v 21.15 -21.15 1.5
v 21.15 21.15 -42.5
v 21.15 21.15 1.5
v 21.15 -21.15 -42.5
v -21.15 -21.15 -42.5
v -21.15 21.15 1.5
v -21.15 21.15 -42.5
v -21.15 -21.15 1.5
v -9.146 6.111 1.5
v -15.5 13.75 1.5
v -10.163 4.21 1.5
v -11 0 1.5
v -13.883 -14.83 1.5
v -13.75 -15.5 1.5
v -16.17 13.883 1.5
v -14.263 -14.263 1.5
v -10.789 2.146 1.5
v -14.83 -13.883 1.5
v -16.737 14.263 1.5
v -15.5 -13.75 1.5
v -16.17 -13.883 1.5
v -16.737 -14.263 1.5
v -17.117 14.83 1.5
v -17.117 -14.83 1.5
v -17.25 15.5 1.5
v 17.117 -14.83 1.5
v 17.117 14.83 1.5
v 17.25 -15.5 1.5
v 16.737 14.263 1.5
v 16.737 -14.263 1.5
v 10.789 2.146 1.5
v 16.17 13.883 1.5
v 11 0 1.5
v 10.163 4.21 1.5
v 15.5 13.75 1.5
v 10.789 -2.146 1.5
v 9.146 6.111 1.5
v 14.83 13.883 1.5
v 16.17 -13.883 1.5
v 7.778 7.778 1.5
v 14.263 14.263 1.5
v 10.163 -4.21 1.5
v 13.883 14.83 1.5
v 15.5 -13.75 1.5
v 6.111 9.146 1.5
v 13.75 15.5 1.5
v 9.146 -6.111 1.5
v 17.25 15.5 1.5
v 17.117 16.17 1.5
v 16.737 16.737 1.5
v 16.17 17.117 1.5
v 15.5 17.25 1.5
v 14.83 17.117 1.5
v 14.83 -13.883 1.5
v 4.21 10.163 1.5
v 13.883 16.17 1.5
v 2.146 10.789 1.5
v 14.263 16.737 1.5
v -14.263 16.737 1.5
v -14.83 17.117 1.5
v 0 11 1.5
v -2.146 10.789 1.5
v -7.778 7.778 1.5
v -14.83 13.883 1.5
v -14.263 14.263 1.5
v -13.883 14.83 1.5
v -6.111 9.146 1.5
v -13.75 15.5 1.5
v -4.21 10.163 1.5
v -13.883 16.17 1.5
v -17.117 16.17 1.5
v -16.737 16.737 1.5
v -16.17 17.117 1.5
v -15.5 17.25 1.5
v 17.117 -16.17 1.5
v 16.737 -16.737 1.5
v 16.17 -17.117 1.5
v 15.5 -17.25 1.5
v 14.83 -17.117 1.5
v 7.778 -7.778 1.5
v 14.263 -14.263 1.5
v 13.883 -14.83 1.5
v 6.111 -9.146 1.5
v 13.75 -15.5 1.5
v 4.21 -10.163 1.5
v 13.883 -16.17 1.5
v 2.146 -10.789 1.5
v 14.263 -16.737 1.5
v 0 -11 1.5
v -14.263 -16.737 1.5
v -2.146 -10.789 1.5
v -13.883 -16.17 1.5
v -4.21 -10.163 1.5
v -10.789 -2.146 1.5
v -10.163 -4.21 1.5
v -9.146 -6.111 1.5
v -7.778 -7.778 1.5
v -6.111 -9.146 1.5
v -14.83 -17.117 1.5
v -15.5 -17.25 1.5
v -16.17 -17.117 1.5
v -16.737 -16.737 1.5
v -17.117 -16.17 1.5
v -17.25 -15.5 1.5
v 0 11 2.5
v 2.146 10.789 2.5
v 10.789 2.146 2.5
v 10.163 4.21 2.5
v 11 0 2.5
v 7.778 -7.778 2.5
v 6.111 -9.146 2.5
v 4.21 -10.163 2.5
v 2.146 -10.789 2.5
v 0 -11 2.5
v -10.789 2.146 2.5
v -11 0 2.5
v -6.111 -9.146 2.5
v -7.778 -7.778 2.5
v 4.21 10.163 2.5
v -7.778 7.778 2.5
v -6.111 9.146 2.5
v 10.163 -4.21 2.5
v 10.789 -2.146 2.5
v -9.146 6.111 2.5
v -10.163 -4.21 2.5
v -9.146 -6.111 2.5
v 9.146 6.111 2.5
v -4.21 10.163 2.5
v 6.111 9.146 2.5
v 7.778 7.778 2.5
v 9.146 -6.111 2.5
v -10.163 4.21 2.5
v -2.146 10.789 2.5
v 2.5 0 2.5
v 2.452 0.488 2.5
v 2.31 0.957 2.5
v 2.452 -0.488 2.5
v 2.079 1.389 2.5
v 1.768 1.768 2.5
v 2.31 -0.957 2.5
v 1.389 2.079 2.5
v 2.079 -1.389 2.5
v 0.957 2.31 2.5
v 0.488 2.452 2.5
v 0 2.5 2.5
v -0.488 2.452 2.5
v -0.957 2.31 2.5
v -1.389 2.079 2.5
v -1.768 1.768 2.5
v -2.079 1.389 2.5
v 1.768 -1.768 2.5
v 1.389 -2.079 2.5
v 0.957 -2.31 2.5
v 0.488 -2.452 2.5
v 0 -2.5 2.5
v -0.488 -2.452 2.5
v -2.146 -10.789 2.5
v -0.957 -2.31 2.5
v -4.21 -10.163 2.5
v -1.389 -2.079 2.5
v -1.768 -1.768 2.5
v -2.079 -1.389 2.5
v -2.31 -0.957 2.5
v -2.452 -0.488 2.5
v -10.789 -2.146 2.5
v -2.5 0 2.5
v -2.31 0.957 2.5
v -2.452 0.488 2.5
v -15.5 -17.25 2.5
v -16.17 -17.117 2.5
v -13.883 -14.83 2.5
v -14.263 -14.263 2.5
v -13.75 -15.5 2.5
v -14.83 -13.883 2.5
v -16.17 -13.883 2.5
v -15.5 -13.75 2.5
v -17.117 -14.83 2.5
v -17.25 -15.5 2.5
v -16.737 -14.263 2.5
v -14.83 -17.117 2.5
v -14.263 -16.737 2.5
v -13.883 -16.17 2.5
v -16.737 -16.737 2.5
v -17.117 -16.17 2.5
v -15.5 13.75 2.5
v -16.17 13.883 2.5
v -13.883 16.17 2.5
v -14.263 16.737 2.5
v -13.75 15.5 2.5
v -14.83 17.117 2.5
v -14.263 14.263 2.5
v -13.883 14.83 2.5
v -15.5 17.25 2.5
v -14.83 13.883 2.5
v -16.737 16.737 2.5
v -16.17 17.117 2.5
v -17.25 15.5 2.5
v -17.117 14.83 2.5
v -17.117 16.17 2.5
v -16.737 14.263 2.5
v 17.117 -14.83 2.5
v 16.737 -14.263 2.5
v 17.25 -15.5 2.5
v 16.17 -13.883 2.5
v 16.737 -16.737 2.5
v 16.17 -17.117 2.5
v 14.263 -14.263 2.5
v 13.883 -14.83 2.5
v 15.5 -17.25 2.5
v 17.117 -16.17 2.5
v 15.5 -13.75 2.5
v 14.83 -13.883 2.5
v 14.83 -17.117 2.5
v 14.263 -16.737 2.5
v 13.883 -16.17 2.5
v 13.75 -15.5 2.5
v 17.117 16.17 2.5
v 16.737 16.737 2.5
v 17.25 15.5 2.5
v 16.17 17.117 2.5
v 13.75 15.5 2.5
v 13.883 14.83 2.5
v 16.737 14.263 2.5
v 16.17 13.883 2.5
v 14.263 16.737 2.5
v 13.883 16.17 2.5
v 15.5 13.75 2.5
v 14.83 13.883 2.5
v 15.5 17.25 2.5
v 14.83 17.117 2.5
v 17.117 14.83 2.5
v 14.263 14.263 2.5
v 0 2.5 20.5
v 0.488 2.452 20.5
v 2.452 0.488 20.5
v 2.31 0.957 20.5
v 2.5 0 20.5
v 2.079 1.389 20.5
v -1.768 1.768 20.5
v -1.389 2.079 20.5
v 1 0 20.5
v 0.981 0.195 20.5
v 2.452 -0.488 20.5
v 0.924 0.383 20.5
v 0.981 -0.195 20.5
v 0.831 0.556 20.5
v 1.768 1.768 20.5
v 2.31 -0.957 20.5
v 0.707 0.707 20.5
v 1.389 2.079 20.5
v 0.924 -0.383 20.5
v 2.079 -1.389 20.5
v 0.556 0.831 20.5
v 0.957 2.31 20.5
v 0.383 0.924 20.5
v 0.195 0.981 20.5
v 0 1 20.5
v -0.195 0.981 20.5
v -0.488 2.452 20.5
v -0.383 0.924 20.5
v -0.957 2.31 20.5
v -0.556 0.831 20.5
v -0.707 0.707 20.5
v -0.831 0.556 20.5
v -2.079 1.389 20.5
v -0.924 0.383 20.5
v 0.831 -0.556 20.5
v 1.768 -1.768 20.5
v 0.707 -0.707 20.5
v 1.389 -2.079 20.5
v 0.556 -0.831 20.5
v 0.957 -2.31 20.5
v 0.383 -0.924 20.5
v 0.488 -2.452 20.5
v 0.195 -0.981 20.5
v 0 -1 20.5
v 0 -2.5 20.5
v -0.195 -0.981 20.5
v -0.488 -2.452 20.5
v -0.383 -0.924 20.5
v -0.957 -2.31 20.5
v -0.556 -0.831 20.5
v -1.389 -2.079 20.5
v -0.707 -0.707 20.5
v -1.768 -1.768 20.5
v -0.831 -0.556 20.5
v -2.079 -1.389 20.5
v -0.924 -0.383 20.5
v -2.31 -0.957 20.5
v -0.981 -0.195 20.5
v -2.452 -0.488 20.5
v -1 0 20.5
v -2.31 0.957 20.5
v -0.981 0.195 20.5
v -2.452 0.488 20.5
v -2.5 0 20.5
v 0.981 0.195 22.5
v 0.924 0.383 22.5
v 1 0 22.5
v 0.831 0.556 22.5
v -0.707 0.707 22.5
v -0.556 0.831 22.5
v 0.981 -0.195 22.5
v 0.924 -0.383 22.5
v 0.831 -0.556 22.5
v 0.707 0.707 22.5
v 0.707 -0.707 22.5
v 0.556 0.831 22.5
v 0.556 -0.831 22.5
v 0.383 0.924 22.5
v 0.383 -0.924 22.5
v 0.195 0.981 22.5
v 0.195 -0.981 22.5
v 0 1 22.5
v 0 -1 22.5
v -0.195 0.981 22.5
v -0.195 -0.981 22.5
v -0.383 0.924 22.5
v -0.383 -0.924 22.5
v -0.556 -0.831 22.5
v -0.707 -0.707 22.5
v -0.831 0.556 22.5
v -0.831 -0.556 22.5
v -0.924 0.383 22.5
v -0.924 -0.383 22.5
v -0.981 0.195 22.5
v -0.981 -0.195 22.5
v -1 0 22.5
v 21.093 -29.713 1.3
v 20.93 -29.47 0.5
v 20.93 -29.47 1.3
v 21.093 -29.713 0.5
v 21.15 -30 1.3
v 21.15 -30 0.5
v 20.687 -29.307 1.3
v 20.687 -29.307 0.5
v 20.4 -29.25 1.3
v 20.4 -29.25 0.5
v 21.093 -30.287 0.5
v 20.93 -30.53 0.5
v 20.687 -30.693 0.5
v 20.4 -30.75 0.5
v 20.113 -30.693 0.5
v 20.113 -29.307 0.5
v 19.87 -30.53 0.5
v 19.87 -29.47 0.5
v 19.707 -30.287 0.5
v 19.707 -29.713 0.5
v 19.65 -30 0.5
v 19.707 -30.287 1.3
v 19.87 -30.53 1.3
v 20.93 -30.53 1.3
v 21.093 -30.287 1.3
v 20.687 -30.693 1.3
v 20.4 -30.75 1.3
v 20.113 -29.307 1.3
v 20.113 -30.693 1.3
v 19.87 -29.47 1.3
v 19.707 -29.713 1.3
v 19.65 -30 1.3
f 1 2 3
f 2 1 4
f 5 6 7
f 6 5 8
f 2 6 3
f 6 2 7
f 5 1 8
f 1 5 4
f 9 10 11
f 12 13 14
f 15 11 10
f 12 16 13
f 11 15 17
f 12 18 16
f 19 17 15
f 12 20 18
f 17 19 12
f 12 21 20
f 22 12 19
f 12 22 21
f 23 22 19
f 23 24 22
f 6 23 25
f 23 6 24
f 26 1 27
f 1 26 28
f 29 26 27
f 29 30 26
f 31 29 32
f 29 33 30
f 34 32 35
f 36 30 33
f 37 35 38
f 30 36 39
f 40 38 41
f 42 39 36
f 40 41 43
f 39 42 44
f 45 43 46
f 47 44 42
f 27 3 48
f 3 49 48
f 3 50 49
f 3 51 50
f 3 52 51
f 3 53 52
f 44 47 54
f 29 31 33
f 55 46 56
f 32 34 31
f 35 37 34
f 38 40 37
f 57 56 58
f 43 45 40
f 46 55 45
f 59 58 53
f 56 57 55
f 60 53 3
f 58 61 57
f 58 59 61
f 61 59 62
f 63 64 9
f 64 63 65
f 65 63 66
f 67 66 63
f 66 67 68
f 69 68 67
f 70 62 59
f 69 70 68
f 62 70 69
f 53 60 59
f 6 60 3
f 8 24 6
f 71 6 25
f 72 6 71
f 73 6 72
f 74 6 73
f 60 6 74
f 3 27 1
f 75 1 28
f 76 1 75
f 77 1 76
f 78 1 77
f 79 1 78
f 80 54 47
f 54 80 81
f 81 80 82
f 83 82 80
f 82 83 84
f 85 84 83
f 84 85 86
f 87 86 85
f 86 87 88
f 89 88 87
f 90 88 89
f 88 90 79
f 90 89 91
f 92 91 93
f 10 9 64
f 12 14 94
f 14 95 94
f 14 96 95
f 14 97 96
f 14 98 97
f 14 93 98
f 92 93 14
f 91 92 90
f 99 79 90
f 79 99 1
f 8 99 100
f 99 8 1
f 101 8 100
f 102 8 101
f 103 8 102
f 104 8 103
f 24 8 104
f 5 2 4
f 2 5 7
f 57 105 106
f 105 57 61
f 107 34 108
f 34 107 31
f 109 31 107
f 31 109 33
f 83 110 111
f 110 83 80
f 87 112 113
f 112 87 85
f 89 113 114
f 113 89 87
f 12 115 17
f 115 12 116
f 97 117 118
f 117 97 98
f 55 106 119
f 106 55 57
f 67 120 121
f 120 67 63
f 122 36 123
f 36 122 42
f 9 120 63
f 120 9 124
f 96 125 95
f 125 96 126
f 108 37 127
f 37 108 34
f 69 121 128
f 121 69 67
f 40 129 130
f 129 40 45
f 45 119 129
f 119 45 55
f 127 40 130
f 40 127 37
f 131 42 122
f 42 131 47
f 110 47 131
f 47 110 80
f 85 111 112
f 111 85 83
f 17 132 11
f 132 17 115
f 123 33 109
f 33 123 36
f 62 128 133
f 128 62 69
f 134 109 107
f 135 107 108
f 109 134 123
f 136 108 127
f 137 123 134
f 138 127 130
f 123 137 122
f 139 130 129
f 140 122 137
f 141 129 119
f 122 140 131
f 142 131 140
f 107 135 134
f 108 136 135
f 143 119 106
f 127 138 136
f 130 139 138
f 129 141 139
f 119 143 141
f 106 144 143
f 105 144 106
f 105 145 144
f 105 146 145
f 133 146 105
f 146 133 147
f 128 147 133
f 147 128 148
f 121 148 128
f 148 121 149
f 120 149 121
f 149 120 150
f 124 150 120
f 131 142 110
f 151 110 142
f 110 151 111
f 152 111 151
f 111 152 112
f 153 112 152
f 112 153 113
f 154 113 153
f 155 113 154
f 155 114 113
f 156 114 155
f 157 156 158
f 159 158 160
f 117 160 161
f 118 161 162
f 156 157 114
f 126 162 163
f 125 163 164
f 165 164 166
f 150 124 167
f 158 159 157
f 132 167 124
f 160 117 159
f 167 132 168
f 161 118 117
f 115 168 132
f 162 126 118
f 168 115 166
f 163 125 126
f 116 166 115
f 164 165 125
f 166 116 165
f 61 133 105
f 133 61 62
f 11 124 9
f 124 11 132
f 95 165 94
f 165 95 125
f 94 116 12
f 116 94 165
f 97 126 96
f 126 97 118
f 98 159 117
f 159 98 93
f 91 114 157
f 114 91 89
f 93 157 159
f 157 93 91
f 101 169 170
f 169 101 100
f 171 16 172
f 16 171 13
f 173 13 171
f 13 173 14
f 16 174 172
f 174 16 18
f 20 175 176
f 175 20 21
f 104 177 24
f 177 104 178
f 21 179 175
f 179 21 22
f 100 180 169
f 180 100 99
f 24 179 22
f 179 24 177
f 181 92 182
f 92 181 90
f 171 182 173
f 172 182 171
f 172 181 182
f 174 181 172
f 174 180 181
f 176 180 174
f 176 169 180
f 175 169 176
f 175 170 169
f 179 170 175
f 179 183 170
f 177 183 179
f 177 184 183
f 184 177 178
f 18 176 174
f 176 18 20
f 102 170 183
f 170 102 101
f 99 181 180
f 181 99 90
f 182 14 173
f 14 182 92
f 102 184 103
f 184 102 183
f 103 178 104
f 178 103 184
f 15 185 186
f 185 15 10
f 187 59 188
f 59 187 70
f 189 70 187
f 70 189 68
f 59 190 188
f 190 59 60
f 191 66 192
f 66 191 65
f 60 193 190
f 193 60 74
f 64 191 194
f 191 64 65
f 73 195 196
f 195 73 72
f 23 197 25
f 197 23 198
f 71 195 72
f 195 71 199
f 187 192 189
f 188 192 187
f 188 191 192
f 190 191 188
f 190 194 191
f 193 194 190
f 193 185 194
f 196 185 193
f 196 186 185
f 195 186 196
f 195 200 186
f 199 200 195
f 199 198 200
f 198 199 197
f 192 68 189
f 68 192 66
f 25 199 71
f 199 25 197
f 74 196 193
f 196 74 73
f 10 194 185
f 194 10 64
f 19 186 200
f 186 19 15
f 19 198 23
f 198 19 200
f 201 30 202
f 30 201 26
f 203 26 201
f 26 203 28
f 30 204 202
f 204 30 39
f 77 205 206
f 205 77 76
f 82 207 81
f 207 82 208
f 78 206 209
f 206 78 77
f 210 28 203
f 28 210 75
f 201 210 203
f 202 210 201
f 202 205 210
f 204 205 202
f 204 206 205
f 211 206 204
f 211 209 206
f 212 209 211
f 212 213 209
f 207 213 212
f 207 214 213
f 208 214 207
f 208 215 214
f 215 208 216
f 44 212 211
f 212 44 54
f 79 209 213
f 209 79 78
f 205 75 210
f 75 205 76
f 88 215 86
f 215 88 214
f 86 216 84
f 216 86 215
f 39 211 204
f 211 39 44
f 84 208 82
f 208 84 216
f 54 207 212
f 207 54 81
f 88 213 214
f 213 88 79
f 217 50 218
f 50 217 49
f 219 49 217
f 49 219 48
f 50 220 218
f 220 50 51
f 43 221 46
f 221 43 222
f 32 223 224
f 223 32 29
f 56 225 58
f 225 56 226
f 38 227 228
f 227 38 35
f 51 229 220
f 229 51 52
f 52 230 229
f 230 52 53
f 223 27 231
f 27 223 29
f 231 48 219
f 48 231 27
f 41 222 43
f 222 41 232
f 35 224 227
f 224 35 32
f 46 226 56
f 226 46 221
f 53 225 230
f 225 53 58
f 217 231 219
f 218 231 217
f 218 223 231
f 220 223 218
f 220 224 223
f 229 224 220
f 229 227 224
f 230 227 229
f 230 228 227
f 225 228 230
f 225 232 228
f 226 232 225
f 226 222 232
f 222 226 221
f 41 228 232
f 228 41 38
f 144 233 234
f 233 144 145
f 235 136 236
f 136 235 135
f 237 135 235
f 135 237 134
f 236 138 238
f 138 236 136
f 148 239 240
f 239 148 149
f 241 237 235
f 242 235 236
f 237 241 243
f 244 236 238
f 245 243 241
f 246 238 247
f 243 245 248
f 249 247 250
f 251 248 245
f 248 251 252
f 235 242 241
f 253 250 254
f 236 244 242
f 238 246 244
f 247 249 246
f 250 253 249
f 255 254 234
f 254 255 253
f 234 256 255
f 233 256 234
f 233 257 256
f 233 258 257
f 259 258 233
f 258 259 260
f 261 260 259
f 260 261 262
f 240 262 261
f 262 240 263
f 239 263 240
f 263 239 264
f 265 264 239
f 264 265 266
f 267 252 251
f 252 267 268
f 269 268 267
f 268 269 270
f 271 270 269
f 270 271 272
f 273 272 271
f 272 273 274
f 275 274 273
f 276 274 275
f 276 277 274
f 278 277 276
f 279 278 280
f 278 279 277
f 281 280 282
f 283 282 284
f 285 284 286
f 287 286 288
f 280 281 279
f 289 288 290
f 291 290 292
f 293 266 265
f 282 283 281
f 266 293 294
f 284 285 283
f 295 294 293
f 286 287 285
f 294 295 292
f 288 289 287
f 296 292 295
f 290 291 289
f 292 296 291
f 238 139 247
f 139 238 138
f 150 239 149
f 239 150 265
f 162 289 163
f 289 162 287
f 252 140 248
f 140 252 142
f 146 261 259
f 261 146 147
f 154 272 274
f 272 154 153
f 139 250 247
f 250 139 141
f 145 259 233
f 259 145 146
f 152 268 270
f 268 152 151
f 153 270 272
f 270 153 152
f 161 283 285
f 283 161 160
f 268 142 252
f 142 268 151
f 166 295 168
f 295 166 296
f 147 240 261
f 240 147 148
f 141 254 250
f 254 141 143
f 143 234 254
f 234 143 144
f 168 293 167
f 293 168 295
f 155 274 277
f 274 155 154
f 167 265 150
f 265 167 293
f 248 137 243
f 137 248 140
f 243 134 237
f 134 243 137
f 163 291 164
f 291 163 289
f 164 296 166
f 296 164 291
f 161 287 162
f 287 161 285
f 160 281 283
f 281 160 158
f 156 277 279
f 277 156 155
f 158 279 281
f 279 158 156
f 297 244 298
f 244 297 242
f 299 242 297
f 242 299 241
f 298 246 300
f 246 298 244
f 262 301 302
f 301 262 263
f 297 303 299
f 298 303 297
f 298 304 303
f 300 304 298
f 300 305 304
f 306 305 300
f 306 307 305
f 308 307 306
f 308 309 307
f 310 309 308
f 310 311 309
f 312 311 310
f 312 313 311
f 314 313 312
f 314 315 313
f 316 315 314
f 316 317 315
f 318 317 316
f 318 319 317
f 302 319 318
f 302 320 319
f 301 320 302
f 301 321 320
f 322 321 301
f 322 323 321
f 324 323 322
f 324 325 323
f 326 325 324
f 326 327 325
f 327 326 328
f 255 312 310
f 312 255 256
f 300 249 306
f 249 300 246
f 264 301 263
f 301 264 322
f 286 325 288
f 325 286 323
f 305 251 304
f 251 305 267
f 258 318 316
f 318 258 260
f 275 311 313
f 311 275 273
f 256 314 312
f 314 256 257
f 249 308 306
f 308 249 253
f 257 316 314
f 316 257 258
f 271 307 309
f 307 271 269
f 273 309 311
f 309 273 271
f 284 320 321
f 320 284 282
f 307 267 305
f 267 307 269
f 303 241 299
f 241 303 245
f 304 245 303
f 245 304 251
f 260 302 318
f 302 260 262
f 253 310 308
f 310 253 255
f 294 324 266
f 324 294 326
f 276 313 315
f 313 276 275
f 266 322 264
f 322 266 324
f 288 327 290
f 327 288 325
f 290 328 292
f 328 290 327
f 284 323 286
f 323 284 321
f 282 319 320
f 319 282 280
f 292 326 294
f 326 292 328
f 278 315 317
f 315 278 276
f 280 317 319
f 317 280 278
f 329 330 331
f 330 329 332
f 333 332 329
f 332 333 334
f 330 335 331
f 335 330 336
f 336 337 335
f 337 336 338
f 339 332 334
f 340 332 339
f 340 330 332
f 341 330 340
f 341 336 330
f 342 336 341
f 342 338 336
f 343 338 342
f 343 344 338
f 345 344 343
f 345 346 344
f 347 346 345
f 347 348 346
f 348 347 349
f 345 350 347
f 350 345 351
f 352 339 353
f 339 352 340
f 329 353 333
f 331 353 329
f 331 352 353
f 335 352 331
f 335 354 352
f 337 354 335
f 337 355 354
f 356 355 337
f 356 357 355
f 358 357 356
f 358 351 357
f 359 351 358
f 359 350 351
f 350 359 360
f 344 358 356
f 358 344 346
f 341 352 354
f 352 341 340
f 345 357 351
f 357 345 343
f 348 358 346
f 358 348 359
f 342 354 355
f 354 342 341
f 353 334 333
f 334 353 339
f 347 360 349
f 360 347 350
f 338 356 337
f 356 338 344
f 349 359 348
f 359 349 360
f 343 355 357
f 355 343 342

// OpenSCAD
// Parameters
face_width = 42.3; //[21.15:84.6:0.1]
face_thickness = 3.0; //[1.5:6.0:0.1]
body_length = 40.0; //[20.0:80.0:0.1]
body_width = 42.3; //[21.15:84.6:0.1]
body_height = 42.3; //[21.15:84.6:0.1]
rear_cap_thickness = 2.0; //[1.0:4.0:0.1]
shaft_diameter = 5.0; //[2.5:10.0:0.1]
shaft_length = 20.0; //[10.0:40.0:0.1]
front_boss_diameter = 22.0; //[11.0:44.0:0.1]
front_boss_height = 2.0; //[1.0:4.0:0.1]
mount_hole_spacing = 31.0; //[15.5:62.0:0.1]
mount_hole_diameter = 3.5; //[1.75:7.0:0.1]
corner_radius = 2.0; //[1.0:4.0:0.1]
shaft_center_bore_diameter = 2.0; //[0.5:4.0:0.1]
shaft_center_bore_depth = 6.0; //[2.0:12.0:0.1]
overlap = 1.0; //[0.5:2.0:0.1]
pattern_marker_diameter = 1.5; //[0.8:3.0:0.1]
pattern_marker_height = 0.8; //[0.4:2.0:0.1]
ttrack_length = 60.0; //[30.0:120.0:0.5]
ttrack_pitch = 20.0; //[10.0:40.0:0.5]
ttrack_insert_num_holes = 3.0; //[1.0:8.0:1.0]
rail_hole_spacing = 25.0; //[12.5:50.0:0.5]
grill_hole_spacing = 8.0; //[4.0:16.0:0.5]

// Motor Shaft
module motor_shaft() {
  color("Silver") {
    translate([0, 0, face_thickness/2 + shaft_length/2 - overlap])
      cylinder(r=shaft_diameter/2, h=shaft_length, center=true, $fn=32);
    translate([0, 0, face_thickness/2 + shaft_length - shaft_center_bore_depth/2])
      cylinder(r=shaft_center_bore_diameter/2, h=shaft_center_bore_depth + overlap*2, center=true, $fn=32);
  }
}

// Ttrack Hole Positions
module ttrack_hole_positions() {
  color("DimGray") {
    for (i = [0:ttrack_insert_num_holes-1]) {
      translate([face_width/2 - pattern_marker_diameter/2, ttrack_length/2 - (i+1)*ttrack_pitch, face_thickness/2 + pattern_marker_height/2 - overlap])
        cylinder(r=pattern_marker_diameter/2, h=pattern_marker_height, center=true, $fn=16);
    }
  }
}

// Ttrack Insert Hole Positions
module ttrack_insert_hole_positions() {
  color("DimGray") {
    for (i = [-1, 0, 1]) {
      translate([face_width/2 - pattern_marker_diameter/2, i*ttrack_length/(ttrack_insert_num_holes+1), face_thickness/2 + pattern_marker_height/2 - overlap])
        cylinder(r=pattern_marker_diameter/2, h=pattern_marker_height, center=true, $fn=16);
    }
  }
}

// Rail Hole Positions
module rail_hole_positions() {
  color("DimGray") {
    for (i = [-1, 1]) {
      translate([-face_width/2 + pattern_marker_diameter/2, i*rail_hole_spacing/2, face_thickness/2 + pattern_marker_height/2 - overlap])
        cylinder(r=pattern_marker_diameter/2, h=pattern_marker_height, center=true, $fn=16);
    }
  }
}

// Grill Hole Positions
module grill_hole_positions() {
  color("DimGray") {
    for (i = [-1, 1]) {
      for (j = [-1, 1]) {
        translate([i*grill_hole_spacing, j*grill_hole_spacing, -(face_thickness/2 + body_length + rear_cap_thickness/2 - overlap) + rear_cap_thickness/2 - pattern_marker_height/2 + overlap])
          cylinder(r=pattern_marker_diameter/2, h=pattern_marker_height, center=true, $fn=16);
      }
    }
  }
}

// Assembly
module assembly() {
  color("Black") {
    // Motor Body
    translate([0, 0, -(face_thickness/2 + body_length/2 - overlap)])
      cube([body_width, body_height, body_length], center=true);
    // Front Face
    translate([0, 0, 0])
      cube([face_width, face_width, face_thickness], center=true);
    // Rear Cap
    translate([0, 0, -(face_thickness/2 + body_length + rear_cap_thickness/2 - overlap)])
      cube([body_width, body_height, rear_cap_thickness], center=true);
    // Front Boss Register
    translate([0, 0, face_thickness/2 + front_boss_height/2 - overlap])
      cylinder(r=front_boss_diameter/2, h=front_boss_height, center=true, $fn=32);
  }
  
  // Mounting Holes
  color("Silver") {
    for (x = [-1, 1]) {
      for (y = [-1, 1]) {
        translate([x*mount_hole_spacing/2, y*mount_hole_spacing/2, 0])
          cylinder(r=mount_hole_diameter/2, h=face_thickness + overlap*2, center=true, $fn=16);
      }
    }
  }
  
  // Include detailed components
  motor_shaft();
  ttrack_hole_positions();
  ttrack_insert_hole_positions();
  rail_hole_positions();
  grill_hole_positions();
}

assembly();
